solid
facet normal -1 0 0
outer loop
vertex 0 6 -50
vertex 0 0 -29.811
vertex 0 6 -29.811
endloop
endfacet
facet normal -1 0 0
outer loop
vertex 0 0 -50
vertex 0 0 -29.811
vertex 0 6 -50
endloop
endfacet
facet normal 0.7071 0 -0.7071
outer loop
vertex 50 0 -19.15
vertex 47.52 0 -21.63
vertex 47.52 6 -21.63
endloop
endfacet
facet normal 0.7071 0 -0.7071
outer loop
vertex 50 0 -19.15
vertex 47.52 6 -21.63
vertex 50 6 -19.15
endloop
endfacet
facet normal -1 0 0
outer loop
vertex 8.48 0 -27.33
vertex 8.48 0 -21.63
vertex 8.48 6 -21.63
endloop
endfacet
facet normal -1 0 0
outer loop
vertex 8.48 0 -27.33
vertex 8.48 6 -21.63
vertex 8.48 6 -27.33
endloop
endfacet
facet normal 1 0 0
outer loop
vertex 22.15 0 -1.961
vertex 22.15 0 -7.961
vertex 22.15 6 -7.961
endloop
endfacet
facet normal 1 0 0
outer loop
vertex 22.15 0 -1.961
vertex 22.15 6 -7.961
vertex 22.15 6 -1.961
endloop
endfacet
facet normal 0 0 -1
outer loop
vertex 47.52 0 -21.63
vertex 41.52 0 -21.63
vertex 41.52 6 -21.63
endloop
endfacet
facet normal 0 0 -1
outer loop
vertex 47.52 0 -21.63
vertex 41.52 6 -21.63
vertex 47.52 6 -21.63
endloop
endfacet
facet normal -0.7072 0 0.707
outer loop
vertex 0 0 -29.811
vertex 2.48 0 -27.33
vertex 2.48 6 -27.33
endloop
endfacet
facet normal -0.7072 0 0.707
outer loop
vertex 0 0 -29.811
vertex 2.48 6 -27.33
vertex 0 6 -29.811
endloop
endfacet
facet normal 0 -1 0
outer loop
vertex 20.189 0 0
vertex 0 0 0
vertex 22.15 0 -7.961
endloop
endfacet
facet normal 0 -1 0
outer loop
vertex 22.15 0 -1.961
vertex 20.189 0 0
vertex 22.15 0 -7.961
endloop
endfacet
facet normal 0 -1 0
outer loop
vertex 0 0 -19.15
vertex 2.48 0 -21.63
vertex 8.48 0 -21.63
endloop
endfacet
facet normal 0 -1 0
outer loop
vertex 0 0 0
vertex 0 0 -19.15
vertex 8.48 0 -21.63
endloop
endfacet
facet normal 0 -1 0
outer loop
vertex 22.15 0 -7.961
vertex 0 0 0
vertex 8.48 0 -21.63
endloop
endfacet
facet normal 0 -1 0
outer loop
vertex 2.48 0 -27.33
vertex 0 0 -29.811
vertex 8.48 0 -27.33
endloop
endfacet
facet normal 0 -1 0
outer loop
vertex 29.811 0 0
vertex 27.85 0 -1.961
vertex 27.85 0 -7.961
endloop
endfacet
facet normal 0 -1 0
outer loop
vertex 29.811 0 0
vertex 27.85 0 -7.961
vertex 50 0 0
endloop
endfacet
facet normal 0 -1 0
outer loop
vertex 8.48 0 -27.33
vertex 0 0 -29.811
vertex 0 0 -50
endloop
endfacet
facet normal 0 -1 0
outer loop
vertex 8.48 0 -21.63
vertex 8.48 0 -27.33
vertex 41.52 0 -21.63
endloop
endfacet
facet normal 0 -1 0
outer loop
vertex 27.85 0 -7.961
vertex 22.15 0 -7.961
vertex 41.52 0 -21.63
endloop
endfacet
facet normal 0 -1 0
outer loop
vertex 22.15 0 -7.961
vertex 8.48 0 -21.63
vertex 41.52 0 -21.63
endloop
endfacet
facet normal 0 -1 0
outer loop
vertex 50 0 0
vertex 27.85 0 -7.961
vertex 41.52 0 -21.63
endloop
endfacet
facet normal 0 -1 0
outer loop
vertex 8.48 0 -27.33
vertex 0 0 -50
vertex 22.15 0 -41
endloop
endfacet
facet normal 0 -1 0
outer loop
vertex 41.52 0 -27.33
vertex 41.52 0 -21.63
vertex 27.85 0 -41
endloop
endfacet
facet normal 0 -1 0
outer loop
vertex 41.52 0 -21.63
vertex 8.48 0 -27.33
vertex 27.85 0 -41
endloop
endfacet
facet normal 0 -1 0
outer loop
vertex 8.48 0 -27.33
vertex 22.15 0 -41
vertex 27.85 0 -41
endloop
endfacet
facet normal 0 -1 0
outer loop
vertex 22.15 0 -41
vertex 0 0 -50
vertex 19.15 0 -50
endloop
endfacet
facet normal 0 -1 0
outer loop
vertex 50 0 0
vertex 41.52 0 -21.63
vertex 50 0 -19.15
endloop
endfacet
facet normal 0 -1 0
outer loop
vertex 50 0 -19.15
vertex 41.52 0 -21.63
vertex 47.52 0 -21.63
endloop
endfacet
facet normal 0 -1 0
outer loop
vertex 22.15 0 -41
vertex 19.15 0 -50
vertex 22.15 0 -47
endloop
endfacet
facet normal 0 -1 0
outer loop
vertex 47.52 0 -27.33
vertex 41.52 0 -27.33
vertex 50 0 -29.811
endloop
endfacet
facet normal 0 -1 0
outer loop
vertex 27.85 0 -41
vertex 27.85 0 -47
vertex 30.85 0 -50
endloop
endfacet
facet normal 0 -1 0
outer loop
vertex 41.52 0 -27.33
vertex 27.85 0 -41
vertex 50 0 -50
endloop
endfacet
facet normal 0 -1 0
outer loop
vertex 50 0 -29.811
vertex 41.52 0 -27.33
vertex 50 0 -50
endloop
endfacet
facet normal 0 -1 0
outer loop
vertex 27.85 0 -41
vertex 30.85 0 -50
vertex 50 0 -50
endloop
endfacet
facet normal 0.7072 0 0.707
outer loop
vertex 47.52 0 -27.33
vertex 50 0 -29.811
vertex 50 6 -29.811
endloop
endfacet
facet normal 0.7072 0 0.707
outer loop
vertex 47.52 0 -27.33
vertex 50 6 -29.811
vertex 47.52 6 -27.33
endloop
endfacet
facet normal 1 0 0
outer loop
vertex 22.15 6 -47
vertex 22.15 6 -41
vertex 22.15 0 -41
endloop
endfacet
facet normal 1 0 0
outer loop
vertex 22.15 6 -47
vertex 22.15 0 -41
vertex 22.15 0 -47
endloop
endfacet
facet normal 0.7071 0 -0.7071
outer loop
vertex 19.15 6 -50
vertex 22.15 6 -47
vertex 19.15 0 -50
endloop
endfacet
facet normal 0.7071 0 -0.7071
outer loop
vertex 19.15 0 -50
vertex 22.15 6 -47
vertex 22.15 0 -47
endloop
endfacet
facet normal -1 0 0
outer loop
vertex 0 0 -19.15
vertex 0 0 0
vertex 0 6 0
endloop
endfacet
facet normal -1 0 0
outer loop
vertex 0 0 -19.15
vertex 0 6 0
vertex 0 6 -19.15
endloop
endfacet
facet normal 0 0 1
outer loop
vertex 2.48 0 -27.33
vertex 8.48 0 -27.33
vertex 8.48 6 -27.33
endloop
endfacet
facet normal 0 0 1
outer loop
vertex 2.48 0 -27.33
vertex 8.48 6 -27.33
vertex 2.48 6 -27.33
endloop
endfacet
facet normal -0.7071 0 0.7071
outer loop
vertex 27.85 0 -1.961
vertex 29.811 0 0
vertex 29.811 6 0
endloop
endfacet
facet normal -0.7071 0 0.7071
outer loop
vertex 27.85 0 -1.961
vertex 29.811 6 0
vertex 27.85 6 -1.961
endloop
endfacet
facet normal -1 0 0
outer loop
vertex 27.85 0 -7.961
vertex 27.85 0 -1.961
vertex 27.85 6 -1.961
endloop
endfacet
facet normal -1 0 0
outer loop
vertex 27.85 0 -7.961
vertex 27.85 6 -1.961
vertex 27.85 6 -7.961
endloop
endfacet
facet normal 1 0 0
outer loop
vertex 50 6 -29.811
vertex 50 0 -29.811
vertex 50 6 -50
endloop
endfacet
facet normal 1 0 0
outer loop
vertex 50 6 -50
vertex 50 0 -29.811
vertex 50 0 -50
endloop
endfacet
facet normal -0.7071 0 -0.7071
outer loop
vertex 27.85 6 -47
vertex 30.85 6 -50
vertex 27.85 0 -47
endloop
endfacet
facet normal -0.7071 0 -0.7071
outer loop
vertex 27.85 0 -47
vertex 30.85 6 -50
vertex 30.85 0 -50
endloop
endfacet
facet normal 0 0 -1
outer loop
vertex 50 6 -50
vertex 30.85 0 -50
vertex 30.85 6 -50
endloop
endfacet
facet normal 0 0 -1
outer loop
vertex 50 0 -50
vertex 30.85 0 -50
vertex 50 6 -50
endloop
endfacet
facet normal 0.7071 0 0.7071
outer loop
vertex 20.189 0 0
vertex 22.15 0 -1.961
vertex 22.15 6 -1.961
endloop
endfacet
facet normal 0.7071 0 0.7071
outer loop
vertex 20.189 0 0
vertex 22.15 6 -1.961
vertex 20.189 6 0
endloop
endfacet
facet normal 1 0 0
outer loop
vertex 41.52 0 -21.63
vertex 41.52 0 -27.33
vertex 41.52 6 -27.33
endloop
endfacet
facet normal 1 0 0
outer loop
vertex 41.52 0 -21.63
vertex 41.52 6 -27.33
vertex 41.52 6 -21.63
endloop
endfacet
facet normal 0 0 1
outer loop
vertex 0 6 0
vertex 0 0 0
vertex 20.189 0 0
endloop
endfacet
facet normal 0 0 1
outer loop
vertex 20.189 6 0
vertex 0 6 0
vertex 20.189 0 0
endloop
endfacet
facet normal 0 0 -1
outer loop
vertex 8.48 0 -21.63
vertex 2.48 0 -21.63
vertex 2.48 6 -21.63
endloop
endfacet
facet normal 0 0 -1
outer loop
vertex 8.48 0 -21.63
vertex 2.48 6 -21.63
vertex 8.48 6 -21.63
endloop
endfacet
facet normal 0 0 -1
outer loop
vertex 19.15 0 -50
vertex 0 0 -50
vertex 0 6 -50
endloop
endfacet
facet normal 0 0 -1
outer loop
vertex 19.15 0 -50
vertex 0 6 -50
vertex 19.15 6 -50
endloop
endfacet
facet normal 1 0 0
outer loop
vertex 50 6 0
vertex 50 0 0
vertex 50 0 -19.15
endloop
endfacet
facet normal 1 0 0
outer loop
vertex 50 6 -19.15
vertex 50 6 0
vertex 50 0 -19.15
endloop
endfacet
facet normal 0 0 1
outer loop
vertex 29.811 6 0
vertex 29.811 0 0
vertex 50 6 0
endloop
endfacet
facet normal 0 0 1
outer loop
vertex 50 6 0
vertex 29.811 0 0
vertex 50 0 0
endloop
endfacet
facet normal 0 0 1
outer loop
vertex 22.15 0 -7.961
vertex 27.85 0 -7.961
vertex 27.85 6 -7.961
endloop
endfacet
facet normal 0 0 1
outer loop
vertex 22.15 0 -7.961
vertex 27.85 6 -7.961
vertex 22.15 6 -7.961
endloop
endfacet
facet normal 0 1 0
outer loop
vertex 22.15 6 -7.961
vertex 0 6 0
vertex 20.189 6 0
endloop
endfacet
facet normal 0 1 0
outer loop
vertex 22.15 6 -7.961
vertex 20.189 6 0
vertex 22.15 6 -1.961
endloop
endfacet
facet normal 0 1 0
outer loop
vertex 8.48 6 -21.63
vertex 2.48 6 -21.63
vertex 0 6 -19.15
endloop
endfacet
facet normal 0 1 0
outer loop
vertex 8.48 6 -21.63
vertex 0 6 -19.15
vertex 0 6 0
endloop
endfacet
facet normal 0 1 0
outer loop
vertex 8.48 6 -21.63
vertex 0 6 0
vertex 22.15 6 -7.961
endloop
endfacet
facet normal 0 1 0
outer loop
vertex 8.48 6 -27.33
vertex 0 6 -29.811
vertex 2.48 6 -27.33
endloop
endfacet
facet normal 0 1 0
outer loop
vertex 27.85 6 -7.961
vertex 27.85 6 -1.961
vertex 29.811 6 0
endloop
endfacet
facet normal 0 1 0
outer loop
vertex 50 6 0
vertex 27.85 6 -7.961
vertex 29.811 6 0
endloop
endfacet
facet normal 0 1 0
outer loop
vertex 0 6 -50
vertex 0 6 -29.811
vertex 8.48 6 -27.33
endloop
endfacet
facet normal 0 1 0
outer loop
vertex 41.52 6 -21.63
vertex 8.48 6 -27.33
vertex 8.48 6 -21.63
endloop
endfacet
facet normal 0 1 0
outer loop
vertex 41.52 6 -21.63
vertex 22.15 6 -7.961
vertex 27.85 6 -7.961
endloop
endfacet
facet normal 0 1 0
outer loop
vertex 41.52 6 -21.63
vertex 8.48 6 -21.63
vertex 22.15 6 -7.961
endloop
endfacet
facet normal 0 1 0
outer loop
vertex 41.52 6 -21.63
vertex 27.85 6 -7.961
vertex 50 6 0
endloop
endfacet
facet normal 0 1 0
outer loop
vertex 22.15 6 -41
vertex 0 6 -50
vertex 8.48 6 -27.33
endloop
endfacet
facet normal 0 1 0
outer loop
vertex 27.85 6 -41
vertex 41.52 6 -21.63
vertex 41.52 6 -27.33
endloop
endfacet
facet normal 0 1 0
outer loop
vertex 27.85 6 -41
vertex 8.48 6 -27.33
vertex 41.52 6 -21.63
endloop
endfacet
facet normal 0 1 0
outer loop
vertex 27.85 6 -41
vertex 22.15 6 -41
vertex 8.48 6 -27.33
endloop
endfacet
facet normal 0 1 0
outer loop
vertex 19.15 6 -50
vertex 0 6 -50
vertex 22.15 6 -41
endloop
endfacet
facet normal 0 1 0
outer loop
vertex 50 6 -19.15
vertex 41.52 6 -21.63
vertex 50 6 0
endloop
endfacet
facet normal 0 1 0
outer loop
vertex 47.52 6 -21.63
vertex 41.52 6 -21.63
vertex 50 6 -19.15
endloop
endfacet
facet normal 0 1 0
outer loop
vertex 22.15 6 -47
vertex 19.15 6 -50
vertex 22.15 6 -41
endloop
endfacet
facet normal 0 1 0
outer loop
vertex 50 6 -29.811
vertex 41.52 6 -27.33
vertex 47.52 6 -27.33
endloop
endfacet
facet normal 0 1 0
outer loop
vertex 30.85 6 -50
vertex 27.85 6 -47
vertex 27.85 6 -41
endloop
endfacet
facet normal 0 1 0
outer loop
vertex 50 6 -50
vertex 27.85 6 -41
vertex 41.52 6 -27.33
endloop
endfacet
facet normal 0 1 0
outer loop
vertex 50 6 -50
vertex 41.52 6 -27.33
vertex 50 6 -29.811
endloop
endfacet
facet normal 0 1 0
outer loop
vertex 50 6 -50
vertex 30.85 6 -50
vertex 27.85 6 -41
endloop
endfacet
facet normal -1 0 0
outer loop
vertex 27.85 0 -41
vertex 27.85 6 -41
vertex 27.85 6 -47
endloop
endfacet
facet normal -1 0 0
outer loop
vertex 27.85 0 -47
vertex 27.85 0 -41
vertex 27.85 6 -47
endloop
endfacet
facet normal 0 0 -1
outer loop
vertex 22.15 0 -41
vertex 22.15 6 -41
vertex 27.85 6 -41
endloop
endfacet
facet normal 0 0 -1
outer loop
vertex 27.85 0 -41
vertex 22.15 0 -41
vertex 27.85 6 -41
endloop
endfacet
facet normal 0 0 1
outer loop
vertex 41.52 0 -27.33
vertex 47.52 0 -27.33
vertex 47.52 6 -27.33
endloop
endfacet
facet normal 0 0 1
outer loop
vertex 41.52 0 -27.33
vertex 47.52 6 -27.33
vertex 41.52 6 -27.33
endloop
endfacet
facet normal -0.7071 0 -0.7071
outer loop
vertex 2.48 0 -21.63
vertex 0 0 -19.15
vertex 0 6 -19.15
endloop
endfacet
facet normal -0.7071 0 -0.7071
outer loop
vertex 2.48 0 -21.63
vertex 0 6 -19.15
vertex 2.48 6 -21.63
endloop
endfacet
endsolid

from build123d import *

# Parameters (mm, degrees)
SKETCH1_W           = 50
SKETCH1_H           = 50
BOSS_EXTRUDE1_DEPTH = 6
SKETCH2_W           = 5.7
SKETCH2_H           = 9
CUT_EXTRUDE1_DEPTH  = 6
CHAMFER2_SIZE       = 3
CIRPATTERN4_DEPTH   = 6


# Read off the part's stored shape, not the designer's step: CirPattern4
with BuildPart() as part:
    # Sketch1 → Boss-Extrude1 (new body)
    with BuildSketch(Plane(origin=(0, 0, 0), x_dir=(1, 0, 0), z_dir=(0, 1, 0))):
        with Locations((25, 25)):
            Rectangle(SKETCH1_W, SKETCH1_H)
    extrude(amount=BOSS_EXTRUDE1_DEPTH)

    # Sketch2 → Cut-Extrude1 (cut)
    with BuildSketch(Plane(origin=(0, 6, 0), x_dir=(1, 0, 0), z_dir=(0, 1, 0))):
        with Locations((25, 45.5)):
            Rectangle(SKETCH2_W, SKETCH2_H)
    extrude(amount=-CUT_EXTRUDE1_DEPTH, mode=Mode.SUBTRACT)

    # Chamfer2
    chamfer2_edges = [part.edges().sort_by_distance(p)[0] for p in [
        (22.15, 3, -50),
        (27.85, 3, -50),
    ]]
    chamfer(chamfer2_edges, length=CHAMFER2_SIZE)

    # CirPattern4 outline → CirPattern4 (cut)
    with BuildSketch(Plane(origin=(0, 0, 0), x_dir=(1, 0, 0), z_dir=(0, 1, 0))):
        Polygon((27.85, 7.960814854), (22.15, 7.960814854), (22.15, 1.960814854), (20.189185146, 0), (29.810814854, 0), (27.85, 1.960814854), align=None)
        Polygon((47.519592573, 21.630407427), (50, 19.15), (50, 29.810814854), (47.519592573, 27.330407427), (41.519592573, 27.330407427), (41.519592573, 21.630407427), align=None)
        Polygon((0, 29.810814854), (0, 19.15), (2.480407427, 21.630407427), (8.480407427, 21.630407427), (8.480407427, 27.330407427), (2.480407427, 27.330407427), align=None)
    extrude(amount=CIRPATTERN4_DEPTH, mode=Mode.SUBTRACT)


solid = part.part
